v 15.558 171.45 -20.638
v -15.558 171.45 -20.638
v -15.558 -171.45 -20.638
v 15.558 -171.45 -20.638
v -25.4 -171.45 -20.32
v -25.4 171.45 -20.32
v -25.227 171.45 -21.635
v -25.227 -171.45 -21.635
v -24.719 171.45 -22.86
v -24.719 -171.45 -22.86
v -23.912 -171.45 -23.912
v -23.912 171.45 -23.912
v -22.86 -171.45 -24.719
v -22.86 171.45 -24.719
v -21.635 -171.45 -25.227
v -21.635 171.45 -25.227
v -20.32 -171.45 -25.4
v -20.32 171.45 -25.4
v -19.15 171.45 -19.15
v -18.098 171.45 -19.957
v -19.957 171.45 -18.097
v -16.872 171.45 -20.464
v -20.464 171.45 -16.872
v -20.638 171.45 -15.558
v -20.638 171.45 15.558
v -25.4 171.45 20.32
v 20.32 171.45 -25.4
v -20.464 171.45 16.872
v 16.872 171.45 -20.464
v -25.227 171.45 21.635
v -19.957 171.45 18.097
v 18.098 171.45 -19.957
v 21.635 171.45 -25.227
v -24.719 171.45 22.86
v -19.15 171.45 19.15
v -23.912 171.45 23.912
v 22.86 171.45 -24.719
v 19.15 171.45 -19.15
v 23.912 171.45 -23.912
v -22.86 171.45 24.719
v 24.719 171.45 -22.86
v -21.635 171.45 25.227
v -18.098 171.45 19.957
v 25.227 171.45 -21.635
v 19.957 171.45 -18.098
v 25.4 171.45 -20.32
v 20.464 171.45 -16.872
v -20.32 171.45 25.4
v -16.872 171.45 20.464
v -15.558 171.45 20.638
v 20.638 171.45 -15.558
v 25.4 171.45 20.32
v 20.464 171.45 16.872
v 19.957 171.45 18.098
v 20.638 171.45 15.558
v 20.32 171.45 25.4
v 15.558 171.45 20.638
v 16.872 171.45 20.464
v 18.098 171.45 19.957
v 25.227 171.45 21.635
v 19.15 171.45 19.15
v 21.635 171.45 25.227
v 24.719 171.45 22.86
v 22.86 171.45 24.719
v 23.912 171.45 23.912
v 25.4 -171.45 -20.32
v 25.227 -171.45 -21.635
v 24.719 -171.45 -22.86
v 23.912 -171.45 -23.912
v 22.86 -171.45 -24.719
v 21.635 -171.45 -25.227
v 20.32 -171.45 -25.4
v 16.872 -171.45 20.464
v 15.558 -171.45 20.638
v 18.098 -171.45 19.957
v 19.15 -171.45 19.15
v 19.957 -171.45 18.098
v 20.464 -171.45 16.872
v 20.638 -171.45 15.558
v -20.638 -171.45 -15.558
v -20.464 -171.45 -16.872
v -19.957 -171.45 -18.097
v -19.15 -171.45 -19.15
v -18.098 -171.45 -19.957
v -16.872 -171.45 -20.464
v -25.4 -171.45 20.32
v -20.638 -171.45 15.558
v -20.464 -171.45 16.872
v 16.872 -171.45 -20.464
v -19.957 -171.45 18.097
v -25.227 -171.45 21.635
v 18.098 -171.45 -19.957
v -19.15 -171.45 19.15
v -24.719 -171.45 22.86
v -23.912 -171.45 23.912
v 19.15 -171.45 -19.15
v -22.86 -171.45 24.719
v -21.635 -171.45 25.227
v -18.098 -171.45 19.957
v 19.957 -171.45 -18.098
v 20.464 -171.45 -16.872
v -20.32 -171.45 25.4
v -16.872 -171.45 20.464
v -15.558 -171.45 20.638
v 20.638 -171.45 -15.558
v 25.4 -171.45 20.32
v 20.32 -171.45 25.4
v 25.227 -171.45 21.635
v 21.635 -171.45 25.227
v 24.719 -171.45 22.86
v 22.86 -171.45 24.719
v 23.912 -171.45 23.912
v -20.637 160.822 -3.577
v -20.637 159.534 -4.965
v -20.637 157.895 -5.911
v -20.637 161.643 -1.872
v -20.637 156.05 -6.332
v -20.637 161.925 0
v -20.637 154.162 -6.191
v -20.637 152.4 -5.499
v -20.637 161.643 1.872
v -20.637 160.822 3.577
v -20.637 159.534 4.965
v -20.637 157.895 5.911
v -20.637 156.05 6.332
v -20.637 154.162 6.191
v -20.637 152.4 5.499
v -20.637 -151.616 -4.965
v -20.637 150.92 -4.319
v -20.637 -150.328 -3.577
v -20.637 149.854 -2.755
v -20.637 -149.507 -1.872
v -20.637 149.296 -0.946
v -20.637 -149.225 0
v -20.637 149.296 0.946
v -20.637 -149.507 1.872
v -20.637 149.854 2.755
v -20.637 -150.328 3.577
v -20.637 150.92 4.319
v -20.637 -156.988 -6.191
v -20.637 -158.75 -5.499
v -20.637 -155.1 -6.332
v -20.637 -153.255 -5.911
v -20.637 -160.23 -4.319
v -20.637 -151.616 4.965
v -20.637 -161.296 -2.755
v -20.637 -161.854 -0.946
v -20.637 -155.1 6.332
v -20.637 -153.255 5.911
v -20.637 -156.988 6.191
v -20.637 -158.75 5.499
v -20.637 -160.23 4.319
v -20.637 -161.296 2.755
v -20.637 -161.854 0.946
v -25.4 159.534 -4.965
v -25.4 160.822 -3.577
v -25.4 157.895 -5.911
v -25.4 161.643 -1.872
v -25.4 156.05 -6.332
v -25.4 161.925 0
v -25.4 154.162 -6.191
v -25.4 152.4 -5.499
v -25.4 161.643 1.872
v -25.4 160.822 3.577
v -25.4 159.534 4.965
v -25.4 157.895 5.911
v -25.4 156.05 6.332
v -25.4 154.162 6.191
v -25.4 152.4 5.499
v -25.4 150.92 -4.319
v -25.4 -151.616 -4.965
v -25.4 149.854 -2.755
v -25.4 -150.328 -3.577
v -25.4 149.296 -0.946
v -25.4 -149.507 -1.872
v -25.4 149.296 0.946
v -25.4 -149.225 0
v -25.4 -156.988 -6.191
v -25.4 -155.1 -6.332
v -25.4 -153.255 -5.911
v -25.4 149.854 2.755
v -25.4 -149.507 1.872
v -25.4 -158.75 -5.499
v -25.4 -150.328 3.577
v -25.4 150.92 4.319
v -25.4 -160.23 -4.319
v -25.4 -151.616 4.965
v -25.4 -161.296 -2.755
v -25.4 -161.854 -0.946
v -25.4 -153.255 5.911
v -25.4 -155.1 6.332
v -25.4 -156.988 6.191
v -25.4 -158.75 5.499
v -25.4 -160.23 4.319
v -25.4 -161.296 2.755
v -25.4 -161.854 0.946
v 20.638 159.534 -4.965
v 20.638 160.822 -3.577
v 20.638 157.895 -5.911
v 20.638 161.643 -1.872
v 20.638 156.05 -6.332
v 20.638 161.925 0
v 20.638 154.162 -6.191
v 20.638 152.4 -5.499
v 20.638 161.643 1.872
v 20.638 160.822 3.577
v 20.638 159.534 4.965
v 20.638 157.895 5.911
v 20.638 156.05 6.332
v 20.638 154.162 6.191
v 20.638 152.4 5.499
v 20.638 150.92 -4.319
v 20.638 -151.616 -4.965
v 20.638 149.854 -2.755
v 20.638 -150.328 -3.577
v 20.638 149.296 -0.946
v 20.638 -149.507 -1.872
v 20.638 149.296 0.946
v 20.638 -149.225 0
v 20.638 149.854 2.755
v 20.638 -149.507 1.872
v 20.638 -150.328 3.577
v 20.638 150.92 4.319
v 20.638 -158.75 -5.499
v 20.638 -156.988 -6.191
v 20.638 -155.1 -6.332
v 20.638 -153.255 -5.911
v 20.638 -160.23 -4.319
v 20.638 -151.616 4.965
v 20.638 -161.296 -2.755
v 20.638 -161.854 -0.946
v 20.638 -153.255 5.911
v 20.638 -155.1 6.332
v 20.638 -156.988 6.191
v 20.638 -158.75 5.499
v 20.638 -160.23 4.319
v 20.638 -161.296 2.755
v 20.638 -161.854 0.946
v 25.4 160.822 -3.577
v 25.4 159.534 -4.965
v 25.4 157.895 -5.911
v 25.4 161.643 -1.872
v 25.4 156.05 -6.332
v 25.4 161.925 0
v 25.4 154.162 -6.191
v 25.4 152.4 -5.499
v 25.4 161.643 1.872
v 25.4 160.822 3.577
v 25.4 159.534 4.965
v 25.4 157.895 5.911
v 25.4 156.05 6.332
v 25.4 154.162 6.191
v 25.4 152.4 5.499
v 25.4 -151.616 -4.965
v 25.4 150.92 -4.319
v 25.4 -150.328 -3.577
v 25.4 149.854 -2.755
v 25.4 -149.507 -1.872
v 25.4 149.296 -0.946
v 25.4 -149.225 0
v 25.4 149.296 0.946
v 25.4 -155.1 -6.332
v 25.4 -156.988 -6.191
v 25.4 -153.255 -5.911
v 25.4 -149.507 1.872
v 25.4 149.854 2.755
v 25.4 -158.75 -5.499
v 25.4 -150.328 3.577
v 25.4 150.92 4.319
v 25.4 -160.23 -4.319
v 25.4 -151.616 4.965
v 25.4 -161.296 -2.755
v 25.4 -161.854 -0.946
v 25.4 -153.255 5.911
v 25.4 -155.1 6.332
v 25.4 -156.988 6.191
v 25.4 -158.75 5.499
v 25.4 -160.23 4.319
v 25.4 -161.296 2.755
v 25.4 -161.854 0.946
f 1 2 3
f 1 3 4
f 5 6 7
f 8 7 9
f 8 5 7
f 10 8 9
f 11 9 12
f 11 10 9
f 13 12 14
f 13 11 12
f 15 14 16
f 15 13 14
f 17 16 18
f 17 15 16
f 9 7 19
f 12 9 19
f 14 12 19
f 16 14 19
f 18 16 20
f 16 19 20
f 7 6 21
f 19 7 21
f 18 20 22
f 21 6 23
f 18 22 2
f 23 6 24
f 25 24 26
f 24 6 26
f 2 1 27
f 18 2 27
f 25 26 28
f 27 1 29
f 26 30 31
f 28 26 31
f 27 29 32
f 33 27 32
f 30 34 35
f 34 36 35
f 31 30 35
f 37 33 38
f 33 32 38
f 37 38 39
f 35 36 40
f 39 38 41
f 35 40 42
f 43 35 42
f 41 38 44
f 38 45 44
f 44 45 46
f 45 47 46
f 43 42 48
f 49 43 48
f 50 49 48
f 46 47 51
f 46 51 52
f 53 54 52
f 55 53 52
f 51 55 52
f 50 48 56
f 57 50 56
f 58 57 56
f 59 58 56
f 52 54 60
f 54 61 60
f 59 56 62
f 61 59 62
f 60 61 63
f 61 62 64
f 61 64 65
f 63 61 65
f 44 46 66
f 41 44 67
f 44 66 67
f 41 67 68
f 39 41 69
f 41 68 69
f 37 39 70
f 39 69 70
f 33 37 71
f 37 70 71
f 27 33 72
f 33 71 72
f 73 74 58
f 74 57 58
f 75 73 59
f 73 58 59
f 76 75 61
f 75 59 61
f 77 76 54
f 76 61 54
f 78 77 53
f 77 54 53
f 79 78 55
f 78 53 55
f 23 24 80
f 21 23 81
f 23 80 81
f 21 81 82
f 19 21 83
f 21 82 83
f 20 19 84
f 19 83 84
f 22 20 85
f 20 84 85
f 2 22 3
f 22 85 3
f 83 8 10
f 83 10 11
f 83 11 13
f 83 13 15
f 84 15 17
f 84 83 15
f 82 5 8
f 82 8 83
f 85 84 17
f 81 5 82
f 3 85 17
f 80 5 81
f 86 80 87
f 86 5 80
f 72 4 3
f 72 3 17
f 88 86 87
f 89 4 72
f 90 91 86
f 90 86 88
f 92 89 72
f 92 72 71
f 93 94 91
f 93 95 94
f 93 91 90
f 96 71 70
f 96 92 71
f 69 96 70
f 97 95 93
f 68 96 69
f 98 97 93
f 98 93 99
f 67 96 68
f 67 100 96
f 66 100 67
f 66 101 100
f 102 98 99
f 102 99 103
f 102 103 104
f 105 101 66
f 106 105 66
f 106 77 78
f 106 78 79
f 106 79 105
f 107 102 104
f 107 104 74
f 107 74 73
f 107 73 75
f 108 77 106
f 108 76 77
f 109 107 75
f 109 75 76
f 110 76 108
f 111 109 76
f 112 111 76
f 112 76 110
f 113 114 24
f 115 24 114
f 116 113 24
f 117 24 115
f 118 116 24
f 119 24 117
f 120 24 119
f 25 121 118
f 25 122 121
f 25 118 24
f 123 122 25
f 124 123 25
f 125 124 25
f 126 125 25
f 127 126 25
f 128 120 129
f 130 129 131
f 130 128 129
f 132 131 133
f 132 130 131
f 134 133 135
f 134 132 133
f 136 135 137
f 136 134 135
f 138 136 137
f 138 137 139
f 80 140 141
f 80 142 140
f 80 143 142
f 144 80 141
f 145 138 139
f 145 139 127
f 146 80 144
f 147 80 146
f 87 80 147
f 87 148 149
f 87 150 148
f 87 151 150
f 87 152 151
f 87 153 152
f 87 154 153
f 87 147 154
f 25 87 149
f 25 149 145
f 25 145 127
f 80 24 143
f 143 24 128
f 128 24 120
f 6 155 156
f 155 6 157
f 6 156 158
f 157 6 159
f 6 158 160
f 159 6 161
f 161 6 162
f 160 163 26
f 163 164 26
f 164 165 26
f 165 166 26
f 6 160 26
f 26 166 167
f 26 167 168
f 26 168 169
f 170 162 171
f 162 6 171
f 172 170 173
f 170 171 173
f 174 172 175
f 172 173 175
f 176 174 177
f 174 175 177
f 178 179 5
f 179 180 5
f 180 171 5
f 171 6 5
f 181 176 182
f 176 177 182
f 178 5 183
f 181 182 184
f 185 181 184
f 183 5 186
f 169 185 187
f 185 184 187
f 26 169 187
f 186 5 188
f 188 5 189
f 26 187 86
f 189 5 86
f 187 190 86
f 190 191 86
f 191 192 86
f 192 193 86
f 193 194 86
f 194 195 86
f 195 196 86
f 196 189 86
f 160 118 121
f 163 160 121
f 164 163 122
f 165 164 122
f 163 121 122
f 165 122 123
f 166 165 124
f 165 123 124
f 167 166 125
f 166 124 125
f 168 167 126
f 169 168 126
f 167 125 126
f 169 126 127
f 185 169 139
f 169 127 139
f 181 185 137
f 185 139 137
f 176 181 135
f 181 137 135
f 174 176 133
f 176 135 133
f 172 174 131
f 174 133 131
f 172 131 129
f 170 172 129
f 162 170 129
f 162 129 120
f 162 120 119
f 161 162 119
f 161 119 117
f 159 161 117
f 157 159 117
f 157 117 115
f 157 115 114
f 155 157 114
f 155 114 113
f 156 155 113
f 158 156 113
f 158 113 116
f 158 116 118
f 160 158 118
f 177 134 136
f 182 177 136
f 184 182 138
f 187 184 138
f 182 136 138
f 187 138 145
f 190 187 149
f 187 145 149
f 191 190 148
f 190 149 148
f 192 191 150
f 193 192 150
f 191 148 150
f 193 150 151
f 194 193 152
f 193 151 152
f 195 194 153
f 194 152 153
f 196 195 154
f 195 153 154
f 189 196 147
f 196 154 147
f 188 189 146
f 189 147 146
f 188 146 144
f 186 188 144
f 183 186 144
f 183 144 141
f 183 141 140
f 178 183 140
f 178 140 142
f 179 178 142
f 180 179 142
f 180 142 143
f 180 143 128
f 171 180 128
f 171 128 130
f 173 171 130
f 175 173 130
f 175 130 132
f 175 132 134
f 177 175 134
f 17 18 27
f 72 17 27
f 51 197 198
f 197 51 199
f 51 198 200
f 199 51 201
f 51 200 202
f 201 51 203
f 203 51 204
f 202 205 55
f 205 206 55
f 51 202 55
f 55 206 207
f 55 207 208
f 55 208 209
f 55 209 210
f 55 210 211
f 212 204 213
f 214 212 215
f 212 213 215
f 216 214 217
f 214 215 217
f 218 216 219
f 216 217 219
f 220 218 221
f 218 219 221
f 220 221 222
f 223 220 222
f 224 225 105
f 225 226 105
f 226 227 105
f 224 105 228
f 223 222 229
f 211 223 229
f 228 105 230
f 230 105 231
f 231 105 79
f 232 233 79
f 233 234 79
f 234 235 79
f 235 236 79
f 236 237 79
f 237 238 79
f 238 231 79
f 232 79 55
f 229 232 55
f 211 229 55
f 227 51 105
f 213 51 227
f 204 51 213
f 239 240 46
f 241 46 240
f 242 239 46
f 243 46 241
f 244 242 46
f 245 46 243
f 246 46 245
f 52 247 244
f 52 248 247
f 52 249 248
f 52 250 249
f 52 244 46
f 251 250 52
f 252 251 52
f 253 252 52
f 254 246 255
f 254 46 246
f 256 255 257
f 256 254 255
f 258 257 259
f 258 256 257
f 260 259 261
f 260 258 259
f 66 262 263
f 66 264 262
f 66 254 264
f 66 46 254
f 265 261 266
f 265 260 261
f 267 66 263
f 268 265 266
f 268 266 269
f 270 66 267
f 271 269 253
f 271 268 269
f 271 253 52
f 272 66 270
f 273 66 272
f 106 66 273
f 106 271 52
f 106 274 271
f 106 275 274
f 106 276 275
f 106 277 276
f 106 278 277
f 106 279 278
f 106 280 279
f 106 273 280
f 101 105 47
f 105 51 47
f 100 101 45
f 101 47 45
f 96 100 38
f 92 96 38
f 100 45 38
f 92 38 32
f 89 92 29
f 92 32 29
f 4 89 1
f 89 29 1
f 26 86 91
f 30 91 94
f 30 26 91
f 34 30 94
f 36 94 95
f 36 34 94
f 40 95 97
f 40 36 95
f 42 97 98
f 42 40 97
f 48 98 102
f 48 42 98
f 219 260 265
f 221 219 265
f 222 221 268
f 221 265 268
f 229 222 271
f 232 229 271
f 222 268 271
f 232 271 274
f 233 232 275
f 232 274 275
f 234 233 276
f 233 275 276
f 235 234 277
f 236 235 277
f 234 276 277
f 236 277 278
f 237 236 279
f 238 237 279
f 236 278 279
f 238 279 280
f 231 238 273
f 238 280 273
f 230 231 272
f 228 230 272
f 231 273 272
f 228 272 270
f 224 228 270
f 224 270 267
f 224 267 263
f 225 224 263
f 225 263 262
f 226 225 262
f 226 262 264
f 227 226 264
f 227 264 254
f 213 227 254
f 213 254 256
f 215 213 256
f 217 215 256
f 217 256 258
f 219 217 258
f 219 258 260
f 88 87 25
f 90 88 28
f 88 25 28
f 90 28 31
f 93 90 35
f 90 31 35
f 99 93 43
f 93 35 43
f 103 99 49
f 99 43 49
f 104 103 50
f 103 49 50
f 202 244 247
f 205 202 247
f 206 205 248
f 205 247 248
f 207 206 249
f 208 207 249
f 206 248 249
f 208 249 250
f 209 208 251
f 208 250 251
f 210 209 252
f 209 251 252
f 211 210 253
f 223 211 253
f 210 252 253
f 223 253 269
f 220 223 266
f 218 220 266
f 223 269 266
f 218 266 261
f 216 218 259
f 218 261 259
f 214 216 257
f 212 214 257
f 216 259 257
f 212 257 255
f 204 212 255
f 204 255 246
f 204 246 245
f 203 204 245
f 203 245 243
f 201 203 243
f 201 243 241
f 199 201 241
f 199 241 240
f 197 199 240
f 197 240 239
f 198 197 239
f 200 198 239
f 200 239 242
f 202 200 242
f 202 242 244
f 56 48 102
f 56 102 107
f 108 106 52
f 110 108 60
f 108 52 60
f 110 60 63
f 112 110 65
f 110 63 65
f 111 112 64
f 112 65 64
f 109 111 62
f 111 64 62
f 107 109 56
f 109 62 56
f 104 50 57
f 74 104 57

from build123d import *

# Parameters (mm, degrees)
F0_W     = 50.8
F0_H     = 50.8
F0_W_2   = 41.275
F0_H_2   = 41.275
F1_DEPTH = 171.45
F2_R     = 5.08
F3_R     = 6.35
F4_DEPTH = 50.801


with BuildPart() as f1:
    # F0 (on Front) → F1 (new body, symmetric)
    with BuildSketch(Plane.XZ):
        Rectangle(F0_W, F0_H)
        Rectangle(F0_W_2, F0_H_2, mode=Mode.SUBTRACT)
    extrude(amount=F1_DEPTH, both=True)

    # F2
    f2_edges = [f1.edges().sort_by_distance(p)[0] for p in [
        (-20.6375, 0, 20.6375),
        (25.4, 0, -25.4),
        (-25.4, 0, -25.4),
        (25.4, 0, 25.4),
        (20.6375, 0, -20.6375),
        (-25.4, 0, 25.4),
        (20.6375, 0, 20.6375),
        (-20.6375, 0, -20.6375),
    ]]
    fillet(f2_edges, radius=F2_R)

    # F3 (on face) → F4 (cut, through all)
    with BuildSketch(Plane.YZ.offset(25.4)):
        with Locations((-155.575, 0)):
            Circle(F3_R)
        with Locations((155.575, 0)):
            Circle(F3_R)
    extrude(amount=-F4_DEPTH, mode=Mode.SUBTRACT)


solid = f1.part
